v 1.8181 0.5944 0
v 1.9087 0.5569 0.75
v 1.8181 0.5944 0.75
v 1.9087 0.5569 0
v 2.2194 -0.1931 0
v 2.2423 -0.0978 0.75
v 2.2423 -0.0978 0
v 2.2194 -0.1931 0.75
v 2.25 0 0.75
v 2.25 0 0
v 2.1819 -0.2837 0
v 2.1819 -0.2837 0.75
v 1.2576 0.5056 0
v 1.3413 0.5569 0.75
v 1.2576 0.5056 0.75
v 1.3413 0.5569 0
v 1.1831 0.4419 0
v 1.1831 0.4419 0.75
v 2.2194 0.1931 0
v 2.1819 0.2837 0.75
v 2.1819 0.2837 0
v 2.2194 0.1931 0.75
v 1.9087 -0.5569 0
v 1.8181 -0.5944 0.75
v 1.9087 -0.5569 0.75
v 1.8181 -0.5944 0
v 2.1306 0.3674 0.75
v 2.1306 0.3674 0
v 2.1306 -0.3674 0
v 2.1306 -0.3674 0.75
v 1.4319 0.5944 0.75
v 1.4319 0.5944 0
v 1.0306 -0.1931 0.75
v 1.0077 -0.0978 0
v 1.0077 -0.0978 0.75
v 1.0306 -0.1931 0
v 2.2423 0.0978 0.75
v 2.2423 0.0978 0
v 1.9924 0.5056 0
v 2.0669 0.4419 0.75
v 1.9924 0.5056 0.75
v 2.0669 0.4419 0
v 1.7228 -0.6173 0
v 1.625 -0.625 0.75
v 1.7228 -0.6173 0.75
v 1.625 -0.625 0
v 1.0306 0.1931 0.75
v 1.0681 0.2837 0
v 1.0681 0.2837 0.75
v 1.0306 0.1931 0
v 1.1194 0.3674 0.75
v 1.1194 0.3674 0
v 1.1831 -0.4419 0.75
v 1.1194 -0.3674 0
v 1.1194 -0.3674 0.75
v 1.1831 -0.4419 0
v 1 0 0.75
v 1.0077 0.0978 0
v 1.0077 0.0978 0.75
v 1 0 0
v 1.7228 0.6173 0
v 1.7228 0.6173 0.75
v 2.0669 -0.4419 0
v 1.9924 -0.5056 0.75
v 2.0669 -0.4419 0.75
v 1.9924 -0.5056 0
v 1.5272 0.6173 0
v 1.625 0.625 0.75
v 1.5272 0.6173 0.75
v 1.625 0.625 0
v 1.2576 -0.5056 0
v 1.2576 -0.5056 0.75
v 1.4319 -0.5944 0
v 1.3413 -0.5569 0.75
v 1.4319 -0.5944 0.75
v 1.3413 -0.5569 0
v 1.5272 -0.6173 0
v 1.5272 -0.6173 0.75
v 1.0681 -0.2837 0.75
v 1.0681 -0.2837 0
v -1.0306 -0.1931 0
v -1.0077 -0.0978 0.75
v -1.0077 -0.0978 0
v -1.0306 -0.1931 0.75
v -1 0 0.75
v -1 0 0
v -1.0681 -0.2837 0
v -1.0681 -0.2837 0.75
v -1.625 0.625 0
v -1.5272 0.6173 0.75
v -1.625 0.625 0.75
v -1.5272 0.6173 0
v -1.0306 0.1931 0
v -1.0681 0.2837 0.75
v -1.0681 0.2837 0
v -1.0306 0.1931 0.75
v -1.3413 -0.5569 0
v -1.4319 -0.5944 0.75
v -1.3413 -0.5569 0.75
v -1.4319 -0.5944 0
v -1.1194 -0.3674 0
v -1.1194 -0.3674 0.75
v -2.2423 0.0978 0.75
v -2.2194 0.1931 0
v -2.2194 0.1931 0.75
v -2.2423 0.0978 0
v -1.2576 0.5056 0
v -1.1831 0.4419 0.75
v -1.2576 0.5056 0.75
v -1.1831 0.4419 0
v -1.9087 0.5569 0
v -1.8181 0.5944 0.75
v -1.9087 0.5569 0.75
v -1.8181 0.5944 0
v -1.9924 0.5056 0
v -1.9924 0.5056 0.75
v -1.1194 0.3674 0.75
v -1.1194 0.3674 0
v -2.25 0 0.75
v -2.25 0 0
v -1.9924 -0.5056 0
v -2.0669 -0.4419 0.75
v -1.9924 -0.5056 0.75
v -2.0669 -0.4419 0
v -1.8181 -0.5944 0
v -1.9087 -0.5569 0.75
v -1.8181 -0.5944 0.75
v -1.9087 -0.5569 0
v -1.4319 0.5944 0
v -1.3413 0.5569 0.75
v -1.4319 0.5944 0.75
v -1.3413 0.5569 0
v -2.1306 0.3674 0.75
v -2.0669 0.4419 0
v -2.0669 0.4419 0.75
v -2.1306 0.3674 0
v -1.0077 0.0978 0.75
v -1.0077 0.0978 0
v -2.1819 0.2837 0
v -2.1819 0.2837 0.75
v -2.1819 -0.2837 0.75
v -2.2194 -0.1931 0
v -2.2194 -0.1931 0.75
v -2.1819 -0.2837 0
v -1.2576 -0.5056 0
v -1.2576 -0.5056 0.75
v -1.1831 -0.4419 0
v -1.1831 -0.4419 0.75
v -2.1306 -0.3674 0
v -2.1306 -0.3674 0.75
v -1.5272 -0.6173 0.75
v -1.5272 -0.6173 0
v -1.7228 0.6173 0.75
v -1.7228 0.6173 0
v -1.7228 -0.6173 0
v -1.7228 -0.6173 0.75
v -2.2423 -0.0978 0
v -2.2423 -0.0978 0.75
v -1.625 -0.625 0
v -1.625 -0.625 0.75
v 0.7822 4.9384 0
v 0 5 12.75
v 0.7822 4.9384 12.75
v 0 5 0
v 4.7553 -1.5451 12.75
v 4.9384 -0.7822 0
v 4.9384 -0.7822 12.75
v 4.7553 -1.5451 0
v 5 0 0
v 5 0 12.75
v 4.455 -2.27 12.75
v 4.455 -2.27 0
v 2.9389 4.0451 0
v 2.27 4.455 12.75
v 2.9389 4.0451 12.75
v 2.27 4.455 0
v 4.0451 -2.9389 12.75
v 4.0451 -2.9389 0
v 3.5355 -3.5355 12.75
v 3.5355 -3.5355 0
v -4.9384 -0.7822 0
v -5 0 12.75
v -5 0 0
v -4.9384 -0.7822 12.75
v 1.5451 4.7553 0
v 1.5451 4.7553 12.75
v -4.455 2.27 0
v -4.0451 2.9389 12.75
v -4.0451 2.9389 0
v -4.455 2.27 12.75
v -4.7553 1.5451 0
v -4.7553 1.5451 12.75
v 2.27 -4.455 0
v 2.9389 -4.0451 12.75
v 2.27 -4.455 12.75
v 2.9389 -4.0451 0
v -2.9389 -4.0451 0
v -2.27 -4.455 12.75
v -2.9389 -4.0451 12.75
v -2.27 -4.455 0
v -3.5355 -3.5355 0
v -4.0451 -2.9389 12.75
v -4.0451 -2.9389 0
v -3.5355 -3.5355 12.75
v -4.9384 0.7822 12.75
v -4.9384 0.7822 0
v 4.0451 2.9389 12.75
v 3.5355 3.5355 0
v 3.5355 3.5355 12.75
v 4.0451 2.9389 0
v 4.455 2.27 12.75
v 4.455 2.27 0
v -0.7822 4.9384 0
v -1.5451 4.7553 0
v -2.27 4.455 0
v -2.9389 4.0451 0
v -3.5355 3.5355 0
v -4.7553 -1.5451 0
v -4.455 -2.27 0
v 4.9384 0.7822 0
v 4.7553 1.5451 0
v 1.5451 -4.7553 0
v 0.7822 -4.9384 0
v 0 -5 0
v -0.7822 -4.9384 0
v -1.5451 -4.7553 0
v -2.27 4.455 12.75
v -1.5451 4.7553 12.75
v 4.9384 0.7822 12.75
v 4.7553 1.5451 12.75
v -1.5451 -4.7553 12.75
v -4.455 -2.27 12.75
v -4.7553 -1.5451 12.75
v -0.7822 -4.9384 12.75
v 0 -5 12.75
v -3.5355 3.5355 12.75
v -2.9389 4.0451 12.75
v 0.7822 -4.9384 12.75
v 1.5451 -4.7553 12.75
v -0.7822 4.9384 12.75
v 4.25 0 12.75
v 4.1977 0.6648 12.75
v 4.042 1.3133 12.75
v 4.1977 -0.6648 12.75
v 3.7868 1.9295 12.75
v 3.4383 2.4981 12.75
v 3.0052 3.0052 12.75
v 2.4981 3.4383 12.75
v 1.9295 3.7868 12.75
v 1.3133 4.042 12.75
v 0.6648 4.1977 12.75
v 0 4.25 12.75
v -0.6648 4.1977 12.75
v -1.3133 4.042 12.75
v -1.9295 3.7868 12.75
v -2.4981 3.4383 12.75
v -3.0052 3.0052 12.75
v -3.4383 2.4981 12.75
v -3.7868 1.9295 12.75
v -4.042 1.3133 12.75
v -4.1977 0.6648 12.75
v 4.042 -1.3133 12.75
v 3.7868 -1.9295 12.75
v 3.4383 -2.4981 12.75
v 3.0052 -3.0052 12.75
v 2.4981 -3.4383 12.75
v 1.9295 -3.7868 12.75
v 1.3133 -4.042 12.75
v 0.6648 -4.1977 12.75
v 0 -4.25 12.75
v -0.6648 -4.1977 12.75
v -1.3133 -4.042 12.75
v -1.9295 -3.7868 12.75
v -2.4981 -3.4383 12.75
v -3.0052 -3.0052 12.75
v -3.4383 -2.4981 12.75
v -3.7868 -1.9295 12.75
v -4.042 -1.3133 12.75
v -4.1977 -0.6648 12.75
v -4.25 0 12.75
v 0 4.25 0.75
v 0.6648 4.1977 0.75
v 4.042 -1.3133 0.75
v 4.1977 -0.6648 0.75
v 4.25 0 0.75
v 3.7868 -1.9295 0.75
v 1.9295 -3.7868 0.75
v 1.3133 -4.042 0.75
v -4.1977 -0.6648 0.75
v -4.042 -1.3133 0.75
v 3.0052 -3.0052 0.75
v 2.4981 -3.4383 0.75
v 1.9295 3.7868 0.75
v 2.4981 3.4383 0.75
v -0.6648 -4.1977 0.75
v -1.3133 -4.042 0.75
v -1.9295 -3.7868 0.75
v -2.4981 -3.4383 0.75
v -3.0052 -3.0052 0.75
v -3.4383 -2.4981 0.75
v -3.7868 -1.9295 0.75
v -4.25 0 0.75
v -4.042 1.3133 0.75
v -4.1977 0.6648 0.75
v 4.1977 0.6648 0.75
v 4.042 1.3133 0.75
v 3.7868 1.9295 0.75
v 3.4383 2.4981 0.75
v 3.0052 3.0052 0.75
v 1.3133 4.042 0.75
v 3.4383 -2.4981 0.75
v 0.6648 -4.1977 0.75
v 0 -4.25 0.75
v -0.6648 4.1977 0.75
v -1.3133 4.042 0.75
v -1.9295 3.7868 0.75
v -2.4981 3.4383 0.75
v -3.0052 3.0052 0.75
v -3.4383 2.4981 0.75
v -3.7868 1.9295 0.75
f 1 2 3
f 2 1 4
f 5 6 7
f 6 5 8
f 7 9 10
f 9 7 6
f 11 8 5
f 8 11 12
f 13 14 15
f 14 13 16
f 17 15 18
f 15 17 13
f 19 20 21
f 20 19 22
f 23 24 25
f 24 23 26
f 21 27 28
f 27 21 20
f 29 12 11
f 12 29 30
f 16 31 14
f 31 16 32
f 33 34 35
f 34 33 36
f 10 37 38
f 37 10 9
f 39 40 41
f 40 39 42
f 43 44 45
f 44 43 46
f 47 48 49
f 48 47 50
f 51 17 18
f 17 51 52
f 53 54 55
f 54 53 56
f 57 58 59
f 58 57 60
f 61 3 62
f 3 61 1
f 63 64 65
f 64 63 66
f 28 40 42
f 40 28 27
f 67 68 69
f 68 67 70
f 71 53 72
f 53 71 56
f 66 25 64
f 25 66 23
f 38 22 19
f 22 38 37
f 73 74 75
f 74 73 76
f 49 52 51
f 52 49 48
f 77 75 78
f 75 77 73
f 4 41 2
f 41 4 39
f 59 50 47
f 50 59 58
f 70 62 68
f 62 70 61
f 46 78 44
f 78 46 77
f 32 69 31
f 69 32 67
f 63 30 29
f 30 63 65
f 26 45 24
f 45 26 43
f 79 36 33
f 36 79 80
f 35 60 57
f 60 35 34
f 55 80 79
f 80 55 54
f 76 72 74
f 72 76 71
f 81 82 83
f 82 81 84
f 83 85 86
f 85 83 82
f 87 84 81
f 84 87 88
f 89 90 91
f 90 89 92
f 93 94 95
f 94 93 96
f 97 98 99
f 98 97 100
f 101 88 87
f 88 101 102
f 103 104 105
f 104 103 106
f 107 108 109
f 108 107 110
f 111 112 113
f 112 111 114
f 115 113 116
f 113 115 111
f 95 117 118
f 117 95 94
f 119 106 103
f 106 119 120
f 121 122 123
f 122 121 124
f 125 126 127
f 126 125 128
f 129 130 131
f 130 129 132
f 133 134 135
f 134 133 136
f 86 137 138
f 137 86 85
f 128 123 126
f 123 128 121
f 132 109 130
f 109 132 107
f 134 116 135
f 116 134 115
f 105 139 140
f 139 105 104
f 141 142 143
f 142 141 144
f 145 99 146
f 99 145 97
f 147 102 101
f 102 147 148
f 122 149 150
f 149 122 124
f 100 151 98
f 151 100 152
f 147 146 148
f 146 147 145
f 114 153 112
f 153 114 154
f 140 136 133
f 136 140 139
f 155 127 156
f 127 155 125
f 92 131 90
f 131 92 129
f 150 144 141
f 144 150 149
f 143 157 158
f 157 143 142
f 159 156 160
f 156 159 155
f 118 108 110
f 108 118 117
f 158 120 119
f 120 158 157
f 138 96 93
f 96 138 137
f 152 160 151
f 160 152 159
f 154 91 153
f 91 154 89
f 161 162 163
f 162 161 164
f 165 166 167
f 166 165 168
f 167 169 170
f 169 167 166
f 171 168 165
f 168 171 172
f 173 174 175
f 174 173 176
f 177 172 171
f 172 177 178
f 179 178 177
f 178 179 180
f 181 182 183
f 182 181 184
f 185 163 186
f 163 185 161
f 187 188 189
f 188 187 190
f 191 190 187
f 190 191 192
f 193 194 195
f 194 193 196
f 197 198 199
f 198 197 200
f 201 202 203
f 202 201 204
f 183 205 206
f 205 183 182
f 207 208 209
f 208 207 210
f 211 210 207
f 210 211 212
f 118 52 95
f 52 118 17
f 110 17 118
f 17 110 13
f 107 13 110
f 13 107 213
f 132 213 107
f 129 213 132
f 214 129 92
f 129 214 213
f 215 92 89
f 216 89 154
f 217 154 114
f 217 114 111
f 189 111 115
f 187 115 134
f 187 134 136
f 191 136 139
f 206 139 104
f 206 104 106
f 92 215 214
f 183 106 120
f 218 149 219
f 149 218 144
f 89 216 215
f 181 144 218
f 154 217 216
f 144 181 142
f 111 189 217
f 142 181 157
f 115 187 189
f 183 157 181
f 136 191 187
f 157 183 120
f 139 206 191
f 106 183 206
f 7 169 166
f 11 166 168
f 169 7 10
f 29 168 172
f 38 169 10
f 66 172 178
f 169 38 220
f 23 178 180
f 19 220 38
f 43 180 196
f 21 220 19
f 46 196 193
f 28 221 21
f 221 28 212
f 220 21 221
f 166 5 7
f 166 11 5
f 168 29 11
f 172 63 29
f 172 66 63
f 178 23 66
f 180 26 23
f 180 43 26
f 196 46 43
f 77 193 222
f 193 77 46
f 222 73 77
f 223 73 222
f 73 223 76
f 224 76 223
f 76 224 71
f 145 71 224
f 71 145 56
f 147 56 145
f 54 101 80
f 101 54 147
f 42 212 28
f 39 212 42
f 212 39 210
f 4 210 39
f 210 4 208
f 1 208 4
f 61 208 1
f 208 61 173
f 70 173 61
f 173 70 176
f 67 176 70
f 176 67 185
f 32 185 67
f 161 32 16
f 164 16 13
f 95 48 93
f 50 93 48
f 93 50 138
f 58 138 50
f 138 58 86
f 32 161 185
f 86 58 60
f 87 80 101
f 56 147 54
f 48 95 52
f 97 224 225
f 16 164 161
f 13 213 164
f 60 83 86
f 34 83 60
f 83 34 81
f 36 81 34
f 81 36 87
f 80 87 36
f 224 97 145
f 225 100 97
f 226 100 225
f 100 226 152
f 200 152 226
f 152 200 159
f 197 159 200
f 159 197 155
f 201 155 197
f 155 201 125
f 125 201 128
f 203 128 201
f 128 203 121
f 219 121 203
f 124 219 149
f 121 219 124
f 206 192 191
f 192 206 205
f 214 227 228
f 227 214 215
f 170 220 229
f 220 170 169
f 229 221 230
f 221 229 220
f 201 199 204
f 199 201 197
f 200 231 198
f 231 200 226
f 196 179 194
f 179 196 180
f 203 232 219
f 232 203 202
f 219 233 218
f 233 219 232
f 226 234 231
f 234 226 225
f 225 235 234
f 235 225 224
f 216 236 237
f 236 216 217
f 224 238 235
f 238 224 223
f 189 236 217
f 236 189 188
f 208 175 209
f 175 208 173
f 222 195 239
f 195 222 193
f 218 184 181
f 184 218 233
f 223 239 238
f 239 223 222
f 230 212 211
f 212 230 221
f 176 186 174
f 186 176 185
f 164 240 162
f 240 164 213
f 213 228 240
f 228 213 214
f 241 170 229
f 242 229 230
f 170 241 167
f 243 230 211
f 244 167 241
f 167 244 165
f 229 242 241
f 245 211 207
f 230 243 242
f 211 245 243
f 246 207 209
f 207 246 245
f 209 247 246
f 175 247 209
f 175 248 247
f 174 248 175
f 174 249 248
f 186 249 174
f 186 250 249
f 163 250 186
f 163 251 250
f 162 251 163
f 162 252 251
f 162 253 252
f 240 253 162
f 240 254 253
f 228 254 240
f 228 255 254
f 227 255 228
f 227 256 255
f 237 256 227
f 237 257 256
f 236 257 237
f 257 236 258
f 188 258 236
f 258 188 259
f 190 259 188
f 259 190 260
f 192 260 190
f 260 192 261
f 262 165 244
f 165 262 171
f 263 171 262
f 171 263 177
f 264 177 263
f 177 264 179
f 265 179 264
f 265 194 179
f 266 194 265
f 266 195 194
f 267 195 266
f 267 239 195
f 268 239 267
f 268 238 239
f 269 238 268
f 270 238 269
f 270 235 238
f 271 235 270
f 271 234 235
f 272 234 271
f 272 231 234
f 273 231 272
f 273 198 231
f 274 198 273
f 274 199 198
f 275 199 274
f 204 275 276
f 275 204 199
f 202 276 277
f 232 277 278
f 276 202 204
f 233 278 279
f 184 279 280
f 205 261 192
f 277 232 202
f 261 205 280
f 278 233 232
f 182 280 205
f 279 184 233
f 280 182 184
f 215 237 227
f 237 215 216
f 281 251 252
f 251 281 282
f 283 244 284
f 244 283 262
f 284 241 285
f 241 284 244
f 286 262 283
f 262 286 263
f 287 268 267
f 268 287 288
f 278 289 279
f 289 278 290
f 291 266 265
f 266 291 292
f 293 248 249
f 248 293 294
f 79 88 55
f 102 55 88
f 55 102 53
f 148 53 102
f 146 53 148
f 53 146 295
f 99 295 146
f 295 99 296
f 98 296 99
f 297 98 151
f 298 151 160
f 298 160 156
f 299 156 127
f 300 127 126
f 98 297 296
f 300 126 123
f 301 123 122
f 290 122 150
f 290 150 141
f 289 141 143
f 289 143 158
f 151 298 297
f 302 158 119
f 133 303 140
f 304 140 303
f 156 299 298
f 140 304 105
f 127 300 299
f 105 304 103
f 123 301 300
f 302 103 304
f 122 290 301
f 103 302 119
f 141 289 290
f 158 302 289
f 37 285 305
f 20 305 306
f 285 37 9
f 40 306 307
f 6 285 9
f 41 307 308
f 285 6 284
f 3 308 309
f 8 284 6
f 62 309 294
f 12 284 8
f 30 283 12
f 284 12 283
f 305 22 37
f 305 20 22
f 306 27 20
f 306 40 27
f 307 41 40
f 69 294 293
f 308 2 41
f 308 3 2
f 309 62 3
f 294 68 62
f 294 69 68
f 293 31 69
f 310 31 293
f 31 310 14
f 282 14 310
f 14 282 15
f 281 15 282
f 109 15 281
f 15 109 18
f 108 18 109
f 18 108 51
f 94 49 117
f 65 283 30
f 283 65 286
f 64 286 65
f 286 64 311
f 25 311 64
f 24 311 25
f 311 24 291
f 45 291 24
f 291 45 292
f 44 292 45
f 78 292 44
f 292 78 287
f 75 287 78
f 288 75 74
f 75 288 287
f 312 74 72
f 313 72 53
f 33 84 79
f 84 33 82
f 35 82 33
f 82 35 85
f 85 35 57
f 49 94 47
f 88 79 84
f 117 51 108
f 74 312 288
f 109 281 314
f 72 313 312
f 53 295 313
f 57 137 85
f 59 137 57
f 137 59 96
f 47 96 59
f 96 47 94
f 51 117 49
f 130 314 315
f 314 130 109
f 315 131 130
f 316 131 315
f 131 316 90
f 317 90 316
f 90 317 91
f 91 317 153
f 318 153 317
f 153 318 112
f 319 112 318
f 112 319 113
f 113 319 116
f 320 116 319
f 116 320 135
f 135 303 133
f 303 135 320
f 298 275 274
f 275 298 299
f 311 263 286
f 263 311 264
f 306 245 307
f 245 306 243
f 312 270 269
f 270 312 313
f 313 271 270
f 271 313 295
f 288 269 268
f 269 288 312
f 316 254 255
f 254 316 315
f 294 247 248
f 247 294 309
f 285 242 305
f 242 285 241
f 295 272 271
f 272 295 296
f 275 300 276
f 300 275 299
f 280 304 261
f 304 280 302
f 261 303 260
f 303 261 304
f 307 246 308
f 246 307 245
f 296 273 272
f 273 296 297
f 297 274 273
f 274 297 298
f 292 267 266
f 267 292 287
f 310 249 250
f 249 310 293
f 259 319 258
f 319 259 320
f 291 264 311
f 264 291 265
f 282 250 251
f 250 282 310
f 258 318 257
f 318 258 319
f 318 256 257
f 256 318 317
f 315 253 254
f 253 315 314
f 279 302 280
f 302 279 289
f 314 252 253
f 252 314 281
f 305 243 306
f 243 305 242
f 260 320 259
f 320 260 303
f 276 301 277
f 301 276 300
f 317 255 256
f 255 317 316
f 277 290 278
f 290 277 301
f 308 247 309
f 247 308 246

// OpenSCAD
/*
 * An LED spotlight shade.
 *
 * To prevent the can from glowing, cut a piece of flexible
 * opaque reflective material (aluminum foil, shiny anti-static bag)
 * to fit between the LED and the can wall. This should be 10x26mm (this
 * gives you 2mm overlap).
 */

// Diameter of the LED (mm)
led_diameter = 6.5;

// Clearance between the LED wall and the LED.
interior_clearance = 1;

// Thickness of the wall.
wall_thickness = .75;

// Height of the shade.
shade_height = 12;

// Diameter of the top holes, for the LED leads to go through.
top_hole = 1.25;

// Distance between the top holes. This is from the edge of the holes, not the
// centers, so calipers can be used to measure this accurately for your LED.
top_hole_separation=2;

base_radius = interior_clearance + led_diameter/2;

// Resolution of the cylinders (the number of facets).
resolution = 40;

module shade(){
difference(){
    cylinder(h = shade_height+wall_thickness, r = base_radius+wall_thickness, $fn = resolution);
    cylinder(h = shade_height, r = base_radius, $fn = resolution);
	// Top holes
	translate([0, 0, 10]){
	    translate([(top_hole_separation+top_hole)/2,0,0])
	    cylinder(h = shade_height, r = top_hole/2, $fn = resolution);
	    translate([-(top_hole_separation+top_hole)/2,0,0])
	    cylinder(h = shade_height, r = top_hole/2, $fn = resolution);
	}
    }
}

rotate([180, 0, 0]){
    translate([0, 0, -shade_height-wall_thickness]){
	shade();
    }
}
